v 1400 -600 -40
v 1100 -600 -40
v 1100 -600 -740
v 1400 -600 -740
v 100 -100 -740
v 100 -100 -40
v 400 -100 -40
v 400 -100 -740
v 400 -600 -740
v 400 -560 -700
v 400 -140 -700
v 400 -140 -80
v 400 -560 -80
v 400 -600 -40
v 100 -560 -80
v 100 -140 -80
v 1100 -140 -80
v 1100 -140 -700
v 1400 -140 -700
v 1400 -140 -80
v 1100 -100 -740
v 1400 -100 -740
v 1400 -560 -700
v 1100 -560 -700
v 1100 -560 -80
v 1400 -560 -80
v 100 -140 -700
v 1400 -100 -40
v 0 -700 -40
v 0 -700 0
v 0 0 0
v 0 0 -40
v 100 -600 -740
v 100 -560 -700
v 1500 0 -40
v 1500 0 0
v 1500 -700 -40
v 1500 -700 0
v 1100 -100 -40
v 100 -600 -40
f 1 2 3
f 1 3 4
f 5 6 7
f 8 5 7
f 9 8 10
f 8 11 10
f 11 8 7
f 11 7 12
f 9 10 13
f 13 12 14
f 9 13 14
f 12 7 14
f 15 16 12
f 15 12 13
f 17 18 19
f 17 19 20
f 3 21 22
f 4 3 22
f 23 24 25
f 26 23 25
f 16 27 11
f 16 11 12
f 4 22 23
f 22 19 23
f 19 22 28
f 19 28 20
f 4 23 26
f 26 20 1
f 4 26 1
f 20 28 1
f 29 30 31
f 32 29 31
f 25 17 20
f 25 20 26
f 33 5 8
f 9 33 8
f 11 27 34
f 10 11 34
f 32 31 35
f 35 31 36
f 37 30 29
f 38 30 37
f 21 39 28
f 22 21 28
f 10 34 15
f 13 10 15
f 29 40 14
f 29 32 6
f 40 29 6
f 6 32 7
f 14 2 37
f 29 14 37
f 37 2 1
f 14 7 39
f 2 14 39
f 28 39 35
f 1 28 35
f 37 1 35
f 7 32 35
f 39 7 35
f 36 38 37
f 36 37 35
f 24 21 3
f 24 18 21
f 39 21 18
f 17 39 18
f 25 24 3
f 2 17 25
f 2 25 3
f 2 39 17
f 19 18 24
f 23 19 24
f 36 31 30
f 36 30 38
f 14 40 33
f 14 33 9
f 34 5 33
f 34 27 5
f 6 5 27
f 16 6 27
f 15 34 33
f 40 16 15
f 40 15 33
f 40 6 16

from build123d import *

# Parameters (mm, degrees)
F0_W     = 1500
F0_H     = 700
F1_DEPTH = 40
F2_W     = 300
F2_H     = 500
F3_DEPTH = 700
F4_W     = 420
F4_H     = 620
F5_DEPTH = 1328


with BuildPart() as f1:
    # F0 (on Top) → F1 (new body)
    with BuildSketch(Plane.XY):
        with Locations((750, -350)):
            Rectangle(F0_W, F0_H)
    extrude(amount=-F1_DEPTH)

    # F2 (on face) → F3 (join)
    with BuildSketch(Plane(origin=(0, 0, -40), x_dir=(1, 0, 0), z_dir=(0, 0, -1))):
        with Locations((250, 350)):
            Rectangle(F2_W, F2_H)
        with Locations((1250, 350)):
            Rectangle(F2_W, F2_H)
    extrude(amount=F3_DEPTH)

    # F4 (on face) → F5 (cut)
    with BuildSketch(Plane(origin=(100, 0, 0), x_dir=(0, -1, 0), z_dir=(-1, 0, 0))):
        with Locations((350, -390)):
            Rectangle(F4_W, F4_H)
    extrude(amount=-F5_DEPTH, mode=Mode.SUBTRACT)


solid = f1.part
